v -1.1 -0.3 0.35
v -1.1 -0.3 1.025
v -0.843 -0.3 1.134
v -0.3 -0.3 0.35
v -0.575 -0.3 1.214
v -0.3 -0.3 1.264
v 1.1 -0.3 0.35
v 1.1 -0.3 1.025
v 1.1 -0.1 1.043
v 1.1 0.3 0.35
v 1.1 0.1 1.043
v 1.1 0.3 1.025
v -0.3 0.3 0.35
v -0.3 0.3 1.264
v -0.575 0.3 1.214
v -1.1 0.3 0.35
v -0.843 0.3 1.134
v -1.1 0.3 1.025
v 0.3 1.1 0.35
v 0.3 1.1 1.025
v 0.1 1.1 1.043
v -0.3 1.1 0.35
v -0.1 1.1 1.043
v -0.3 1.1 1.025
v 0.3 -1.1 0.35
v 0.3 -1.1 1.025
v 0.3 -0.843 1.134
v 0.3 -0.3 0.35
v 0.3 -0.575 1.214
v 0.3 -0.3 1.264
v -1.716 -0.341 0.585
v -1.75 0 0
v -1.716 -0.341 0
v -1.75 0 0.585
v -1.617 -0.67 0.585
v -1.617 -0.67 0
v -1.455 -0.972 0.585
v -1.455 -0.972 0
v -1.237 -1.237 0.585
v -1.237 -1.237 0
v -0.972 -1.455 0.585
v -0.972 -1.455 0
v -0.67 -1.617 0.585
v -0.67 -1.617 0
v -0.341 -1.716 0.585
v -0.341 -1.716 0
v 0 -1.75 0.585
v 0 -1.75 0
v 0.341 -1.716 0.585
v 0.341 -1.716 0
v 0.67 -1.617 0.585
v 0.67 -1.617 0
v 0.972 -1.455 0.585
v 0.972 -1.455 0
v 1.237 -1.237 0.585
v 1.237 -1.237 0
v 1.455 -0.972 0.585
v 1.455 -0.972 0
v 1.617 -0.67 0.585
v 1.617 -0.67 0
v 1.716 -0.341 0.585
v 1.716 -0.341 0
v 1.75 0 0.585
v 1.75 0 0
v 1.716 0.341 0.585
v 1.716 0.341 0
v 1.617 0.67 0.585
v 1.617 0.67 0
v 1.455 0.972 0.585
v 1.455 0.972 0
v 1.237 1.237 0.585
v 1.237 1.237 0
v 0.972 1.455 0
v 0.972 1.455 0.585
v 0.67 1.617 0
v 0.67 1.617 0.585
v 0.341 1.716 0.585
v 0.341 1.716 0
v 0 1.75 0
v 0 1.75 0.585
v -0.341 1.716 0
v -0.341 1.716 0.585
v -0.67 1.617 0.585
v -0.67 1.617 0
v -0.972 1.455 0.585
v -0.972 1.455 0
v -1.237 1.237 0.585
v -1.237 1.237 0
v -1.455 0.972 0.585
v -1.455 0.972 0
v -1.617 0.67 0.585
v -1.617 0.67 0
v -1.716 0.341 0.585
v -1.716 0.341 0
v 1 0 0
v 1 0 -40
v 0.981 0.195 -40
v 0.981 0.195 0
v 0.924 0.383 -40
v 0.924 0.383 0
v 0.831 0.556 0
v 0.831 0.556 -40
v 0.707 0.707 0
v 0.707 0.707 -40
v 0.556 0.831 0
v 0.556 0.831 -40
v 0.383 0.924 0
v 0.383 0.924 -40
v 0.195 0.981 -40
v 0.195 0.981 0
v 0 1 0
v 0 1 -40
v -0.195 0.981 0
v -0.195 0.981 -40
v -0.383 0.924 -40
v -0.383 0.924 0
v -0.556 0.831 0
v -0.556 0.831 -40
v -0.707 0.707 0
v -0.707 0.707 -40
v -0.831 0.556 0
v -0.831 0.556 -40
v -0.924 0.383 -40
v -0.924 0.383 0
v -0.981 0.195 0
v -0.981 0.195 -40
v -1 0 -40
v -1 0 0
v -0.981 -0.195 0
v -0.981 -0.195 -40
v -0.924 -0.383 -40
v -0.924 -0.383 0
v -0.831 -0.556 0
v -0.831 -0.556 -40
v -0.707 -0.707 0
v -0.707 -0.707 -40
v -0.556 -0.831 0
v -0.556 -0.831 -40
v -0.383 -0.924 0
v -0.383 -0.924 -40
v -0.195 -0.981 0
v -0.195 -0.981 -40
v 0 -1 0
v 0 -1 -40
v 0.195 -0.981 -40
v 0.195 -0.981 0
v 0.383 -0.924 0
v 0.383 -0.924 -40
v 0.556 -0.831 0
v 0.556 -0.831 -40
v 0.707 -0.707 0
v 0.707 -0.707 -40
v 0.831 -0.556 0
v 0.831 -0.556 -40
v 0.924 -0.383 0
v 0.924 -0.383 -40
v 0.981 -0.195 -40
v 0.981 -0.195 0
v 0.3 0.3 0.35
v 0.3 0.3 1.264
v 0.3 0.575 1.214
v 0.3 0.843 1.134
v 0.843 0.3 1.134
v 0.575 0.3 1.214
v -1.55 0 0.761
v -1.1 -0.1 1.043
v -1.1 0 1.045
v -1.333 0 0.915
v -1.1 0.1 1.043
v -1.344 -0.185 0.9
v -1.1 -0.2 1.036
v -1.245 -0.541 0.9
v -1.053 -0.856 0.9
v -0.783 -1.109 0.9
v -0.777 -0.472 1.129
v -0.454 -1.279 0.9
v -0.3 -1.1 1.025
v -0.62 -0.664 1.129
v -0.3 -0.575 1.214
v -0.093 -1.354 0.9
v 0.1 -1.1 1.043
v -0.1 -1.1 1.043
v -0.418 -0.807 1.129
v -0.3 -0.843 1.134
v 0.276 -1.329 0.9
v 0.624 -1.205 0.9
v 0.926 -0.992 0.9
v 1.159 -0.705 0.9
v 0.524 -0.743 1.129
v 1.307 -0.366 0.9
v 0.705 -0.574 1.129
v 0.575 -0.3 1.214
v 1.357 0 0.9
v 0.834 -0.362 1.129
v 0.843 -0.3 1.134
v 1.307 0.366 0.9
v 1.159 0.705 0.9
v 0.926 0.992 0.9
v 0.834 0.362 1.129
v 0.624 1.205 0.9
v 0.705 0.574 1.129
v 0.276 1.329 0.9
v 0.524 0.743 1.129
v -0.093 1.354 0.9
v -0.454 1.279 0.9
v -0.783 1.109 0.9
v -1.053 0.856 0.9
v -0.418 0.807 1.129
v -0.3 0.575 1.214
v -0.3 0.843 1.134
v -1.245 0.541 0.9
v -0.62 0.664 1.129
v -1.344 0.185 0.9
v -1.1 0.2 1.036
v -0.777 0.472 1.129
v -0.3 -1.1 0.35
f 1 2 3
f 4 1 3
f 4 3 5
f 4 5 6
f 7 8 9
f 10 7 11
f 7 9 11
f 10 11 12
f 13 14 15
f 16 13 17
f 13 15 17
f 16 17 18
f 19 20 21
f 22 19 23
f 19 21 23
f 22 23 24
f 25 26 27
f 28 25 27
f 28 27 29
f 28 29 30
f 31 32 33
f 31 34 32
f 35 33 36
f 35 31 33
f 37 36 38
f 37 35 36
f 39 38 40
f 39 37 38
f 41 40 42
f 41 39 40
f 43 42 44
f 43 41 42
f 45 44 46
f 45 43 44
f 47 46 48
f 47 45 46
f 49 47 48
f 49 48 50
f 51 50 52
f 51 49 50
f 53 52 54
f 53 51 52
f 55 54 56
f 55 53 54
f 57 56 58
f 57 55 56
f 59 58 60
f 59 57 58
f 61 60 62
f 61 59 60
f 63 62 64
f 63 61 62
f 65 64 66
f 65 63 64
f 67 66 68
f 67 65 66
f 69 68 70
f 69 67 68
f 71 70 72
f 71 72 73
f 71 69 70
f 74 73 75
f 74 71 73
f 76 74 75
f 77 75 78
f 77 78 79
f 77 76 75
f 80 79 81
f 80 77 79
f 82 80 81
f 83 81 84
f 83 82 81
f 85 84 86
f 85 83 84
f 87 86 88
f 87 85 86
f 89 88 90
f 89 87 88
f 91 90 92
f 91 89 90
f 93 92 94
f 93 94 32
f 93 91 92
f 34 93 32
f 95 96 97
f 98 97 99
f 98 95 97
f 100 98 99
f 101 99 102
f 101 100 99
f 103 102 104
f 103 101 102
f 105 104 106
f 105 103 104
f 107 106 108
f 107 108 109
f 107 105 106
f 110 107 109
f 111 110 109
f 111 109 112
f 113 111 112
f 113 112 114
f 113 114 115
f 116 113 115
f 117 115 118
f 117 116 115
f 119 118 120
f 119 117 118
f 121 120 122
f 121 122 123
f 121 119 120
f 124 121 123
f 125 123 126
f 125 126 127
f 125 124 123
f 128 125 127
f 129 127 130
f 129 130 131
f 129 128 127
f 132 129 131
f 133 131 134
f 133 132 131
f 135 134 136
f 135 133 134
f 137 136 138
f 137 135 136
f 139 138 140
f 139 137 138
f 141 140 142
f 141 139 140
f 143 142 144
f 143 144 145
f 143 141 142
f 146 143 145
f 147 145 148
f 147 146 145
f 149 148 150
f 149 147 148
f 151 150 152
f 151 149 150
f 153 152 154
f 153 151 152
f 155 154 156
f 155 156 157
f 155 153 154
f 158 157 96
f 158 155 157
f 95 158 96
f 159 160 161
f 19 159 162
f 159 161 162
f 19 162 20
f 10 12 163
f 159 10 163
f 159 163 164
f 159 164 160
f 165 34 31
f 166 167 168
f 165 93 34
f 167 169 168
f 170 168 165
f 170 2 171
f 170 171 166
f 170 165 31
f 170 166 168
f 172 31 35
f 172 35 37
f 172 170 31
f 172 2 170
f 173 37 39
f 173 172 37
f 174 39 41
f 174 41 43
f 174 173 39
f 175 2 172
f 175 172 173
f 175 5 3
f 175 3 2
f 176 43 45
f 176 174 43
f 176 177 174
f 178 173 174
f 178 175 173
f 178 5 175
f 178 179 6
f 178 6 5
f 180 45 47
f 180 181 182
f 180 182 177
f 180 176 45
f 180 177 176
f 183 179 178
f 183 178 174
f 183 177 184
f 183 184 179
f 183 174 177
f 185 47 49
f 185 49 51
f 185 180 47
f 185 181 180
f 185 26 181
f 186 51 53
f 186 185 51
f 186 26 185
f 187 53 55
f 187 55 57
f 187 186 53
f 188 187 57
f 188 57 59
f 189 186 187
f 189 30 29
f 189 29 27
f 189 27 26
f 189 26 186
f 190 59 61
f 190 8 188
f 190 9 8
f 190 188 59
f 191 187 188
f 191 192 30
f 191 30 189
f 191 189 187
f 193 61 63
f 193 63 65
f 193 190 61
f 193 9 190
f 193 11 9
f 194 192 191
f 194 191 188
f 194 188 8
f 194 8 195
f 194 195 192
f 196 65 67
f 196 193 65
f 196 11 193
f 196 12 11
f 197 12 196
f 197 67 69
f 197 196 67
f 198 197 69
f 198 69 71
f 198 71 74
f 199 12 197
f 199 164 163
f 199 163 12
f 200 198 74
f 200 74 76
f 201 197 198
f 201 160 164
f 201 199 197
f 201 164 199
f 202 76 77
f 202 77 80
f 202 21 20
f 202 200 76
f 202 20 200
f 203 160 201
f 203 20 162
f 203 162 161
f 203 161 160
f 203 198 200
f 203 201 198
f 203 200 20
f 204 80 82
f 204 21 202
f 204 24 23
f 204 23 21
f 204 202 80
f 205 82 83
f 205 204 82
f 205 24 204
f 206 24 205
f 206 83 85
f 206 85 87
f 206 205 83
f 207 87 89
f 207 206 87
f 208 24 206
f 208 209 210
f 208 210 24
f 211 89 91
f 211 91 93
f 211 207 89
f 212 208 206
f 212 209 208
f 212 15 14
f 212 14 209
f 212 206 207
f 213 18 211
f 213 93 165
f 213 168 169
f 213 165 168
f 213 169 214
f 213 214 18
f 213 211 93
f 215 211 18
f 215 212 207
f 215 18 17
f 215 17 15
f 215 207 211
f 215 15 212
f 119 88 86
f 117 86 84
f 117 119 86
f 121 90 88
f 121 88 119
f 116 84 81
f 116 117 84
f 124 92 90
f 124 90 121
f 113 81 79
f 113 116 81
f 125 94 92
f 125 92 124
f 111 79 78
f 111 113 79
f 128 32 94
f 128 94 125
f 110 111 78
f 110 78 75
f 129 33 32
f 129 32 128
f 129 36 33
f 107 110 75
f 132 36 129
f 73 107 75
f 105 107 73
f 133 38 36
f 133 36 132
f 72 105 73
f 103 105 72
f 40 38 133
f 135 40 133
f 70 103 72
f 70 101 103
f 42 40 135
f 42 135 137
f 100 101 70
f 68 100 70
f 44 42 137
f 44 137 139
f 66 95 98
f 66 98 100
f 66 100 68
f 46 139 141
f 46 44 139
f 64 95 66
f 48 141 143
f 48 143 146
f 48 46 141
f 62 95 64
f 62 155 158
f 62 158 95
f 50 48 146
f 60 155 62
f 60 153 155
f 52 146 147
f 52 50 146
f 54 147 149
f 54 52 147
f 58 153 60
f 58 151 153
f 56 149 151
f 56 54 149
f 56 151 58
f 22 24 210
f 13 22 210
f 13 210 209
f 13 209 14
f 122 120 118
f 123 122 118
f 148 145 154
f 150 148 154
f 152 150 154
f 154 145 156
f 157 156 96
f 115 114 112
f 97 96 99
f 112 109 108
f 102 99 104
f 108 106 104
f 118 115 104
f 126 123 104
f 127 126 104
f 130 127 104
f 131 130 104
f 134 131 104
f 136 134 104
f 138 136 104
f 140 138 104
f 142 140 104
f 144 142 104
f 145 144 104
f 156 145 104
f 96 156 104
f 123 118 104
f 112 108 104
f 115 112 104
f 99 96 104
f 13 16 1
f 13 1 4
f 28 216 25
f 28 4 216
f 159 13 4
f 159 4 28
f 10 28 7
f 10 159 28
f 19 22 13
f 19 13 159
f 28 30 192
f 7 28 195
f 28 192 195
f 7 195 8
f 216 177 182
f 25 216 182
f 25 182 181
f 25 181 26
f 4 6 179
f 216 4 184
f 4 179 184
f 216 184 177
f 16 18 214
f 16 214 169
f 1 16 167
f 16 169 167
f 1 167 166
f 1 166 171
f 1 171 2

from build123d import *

# Parameters (mm, degrees)
SKETCH_1_R        = 1
EXTRUDE_198_DEPTH = 40
PH1_START         = 1.31
PH1_DEPTH         = 0.96


with BuildPart() as part:
    # 草图1 → Extrude 198 (new body)
    with BuildSketch(Plane.XY):
        Circle(SKETCH_1_R)
    extrude(amount=-EXTRUDE_198_DEPTH)

    # 草图6 → Revolve 324 (revolve)
    with BuildSketch(Plane(origin=(0, 0, 0), x_dir=(1, 0, 0), z_dir=(0, 1, 0)), mode=Mode.PRIVATE) as revolve_324_sk:
        with BuildLine():
            Line((0, 0), (1.75, 0))
            Line((1.75, 0), (1.75, -0.585357107))
            ThreePointArc((1.75, -0.585357107), (0.945147404, -1.114453798), (0, -1.3))
            Line((0, -1.3), (0, 0))
        make_face()
    revolve(revolve_324_sk.sketch.rotate(Axis((0, 0, -2), (0, 0, 1)), 180), axis=Axis((0, 0, -2), (0, 0, 1)))

    # 草图7 → 十字槽_PH1_简化 (cut)
    with BuildSketch(Plane.XY.offset(PH1_START)):
        Polygon((-0.3, -1.1), (0.3, -1.1), (0.3, -0.3), (1.1, -0.3), (1.1, 0.3), (0.3, 0.3), (0.3, 1.1), (-0.3, 1.1), (-0.3, 0.3), (-1.1, 0.3), (-1.1, -0.3), (-0.3, -0.3), align=None)
    extrude(amount=-PH1_DEPTH, mode=Mode.SUBTRACT)


solid = part.part
